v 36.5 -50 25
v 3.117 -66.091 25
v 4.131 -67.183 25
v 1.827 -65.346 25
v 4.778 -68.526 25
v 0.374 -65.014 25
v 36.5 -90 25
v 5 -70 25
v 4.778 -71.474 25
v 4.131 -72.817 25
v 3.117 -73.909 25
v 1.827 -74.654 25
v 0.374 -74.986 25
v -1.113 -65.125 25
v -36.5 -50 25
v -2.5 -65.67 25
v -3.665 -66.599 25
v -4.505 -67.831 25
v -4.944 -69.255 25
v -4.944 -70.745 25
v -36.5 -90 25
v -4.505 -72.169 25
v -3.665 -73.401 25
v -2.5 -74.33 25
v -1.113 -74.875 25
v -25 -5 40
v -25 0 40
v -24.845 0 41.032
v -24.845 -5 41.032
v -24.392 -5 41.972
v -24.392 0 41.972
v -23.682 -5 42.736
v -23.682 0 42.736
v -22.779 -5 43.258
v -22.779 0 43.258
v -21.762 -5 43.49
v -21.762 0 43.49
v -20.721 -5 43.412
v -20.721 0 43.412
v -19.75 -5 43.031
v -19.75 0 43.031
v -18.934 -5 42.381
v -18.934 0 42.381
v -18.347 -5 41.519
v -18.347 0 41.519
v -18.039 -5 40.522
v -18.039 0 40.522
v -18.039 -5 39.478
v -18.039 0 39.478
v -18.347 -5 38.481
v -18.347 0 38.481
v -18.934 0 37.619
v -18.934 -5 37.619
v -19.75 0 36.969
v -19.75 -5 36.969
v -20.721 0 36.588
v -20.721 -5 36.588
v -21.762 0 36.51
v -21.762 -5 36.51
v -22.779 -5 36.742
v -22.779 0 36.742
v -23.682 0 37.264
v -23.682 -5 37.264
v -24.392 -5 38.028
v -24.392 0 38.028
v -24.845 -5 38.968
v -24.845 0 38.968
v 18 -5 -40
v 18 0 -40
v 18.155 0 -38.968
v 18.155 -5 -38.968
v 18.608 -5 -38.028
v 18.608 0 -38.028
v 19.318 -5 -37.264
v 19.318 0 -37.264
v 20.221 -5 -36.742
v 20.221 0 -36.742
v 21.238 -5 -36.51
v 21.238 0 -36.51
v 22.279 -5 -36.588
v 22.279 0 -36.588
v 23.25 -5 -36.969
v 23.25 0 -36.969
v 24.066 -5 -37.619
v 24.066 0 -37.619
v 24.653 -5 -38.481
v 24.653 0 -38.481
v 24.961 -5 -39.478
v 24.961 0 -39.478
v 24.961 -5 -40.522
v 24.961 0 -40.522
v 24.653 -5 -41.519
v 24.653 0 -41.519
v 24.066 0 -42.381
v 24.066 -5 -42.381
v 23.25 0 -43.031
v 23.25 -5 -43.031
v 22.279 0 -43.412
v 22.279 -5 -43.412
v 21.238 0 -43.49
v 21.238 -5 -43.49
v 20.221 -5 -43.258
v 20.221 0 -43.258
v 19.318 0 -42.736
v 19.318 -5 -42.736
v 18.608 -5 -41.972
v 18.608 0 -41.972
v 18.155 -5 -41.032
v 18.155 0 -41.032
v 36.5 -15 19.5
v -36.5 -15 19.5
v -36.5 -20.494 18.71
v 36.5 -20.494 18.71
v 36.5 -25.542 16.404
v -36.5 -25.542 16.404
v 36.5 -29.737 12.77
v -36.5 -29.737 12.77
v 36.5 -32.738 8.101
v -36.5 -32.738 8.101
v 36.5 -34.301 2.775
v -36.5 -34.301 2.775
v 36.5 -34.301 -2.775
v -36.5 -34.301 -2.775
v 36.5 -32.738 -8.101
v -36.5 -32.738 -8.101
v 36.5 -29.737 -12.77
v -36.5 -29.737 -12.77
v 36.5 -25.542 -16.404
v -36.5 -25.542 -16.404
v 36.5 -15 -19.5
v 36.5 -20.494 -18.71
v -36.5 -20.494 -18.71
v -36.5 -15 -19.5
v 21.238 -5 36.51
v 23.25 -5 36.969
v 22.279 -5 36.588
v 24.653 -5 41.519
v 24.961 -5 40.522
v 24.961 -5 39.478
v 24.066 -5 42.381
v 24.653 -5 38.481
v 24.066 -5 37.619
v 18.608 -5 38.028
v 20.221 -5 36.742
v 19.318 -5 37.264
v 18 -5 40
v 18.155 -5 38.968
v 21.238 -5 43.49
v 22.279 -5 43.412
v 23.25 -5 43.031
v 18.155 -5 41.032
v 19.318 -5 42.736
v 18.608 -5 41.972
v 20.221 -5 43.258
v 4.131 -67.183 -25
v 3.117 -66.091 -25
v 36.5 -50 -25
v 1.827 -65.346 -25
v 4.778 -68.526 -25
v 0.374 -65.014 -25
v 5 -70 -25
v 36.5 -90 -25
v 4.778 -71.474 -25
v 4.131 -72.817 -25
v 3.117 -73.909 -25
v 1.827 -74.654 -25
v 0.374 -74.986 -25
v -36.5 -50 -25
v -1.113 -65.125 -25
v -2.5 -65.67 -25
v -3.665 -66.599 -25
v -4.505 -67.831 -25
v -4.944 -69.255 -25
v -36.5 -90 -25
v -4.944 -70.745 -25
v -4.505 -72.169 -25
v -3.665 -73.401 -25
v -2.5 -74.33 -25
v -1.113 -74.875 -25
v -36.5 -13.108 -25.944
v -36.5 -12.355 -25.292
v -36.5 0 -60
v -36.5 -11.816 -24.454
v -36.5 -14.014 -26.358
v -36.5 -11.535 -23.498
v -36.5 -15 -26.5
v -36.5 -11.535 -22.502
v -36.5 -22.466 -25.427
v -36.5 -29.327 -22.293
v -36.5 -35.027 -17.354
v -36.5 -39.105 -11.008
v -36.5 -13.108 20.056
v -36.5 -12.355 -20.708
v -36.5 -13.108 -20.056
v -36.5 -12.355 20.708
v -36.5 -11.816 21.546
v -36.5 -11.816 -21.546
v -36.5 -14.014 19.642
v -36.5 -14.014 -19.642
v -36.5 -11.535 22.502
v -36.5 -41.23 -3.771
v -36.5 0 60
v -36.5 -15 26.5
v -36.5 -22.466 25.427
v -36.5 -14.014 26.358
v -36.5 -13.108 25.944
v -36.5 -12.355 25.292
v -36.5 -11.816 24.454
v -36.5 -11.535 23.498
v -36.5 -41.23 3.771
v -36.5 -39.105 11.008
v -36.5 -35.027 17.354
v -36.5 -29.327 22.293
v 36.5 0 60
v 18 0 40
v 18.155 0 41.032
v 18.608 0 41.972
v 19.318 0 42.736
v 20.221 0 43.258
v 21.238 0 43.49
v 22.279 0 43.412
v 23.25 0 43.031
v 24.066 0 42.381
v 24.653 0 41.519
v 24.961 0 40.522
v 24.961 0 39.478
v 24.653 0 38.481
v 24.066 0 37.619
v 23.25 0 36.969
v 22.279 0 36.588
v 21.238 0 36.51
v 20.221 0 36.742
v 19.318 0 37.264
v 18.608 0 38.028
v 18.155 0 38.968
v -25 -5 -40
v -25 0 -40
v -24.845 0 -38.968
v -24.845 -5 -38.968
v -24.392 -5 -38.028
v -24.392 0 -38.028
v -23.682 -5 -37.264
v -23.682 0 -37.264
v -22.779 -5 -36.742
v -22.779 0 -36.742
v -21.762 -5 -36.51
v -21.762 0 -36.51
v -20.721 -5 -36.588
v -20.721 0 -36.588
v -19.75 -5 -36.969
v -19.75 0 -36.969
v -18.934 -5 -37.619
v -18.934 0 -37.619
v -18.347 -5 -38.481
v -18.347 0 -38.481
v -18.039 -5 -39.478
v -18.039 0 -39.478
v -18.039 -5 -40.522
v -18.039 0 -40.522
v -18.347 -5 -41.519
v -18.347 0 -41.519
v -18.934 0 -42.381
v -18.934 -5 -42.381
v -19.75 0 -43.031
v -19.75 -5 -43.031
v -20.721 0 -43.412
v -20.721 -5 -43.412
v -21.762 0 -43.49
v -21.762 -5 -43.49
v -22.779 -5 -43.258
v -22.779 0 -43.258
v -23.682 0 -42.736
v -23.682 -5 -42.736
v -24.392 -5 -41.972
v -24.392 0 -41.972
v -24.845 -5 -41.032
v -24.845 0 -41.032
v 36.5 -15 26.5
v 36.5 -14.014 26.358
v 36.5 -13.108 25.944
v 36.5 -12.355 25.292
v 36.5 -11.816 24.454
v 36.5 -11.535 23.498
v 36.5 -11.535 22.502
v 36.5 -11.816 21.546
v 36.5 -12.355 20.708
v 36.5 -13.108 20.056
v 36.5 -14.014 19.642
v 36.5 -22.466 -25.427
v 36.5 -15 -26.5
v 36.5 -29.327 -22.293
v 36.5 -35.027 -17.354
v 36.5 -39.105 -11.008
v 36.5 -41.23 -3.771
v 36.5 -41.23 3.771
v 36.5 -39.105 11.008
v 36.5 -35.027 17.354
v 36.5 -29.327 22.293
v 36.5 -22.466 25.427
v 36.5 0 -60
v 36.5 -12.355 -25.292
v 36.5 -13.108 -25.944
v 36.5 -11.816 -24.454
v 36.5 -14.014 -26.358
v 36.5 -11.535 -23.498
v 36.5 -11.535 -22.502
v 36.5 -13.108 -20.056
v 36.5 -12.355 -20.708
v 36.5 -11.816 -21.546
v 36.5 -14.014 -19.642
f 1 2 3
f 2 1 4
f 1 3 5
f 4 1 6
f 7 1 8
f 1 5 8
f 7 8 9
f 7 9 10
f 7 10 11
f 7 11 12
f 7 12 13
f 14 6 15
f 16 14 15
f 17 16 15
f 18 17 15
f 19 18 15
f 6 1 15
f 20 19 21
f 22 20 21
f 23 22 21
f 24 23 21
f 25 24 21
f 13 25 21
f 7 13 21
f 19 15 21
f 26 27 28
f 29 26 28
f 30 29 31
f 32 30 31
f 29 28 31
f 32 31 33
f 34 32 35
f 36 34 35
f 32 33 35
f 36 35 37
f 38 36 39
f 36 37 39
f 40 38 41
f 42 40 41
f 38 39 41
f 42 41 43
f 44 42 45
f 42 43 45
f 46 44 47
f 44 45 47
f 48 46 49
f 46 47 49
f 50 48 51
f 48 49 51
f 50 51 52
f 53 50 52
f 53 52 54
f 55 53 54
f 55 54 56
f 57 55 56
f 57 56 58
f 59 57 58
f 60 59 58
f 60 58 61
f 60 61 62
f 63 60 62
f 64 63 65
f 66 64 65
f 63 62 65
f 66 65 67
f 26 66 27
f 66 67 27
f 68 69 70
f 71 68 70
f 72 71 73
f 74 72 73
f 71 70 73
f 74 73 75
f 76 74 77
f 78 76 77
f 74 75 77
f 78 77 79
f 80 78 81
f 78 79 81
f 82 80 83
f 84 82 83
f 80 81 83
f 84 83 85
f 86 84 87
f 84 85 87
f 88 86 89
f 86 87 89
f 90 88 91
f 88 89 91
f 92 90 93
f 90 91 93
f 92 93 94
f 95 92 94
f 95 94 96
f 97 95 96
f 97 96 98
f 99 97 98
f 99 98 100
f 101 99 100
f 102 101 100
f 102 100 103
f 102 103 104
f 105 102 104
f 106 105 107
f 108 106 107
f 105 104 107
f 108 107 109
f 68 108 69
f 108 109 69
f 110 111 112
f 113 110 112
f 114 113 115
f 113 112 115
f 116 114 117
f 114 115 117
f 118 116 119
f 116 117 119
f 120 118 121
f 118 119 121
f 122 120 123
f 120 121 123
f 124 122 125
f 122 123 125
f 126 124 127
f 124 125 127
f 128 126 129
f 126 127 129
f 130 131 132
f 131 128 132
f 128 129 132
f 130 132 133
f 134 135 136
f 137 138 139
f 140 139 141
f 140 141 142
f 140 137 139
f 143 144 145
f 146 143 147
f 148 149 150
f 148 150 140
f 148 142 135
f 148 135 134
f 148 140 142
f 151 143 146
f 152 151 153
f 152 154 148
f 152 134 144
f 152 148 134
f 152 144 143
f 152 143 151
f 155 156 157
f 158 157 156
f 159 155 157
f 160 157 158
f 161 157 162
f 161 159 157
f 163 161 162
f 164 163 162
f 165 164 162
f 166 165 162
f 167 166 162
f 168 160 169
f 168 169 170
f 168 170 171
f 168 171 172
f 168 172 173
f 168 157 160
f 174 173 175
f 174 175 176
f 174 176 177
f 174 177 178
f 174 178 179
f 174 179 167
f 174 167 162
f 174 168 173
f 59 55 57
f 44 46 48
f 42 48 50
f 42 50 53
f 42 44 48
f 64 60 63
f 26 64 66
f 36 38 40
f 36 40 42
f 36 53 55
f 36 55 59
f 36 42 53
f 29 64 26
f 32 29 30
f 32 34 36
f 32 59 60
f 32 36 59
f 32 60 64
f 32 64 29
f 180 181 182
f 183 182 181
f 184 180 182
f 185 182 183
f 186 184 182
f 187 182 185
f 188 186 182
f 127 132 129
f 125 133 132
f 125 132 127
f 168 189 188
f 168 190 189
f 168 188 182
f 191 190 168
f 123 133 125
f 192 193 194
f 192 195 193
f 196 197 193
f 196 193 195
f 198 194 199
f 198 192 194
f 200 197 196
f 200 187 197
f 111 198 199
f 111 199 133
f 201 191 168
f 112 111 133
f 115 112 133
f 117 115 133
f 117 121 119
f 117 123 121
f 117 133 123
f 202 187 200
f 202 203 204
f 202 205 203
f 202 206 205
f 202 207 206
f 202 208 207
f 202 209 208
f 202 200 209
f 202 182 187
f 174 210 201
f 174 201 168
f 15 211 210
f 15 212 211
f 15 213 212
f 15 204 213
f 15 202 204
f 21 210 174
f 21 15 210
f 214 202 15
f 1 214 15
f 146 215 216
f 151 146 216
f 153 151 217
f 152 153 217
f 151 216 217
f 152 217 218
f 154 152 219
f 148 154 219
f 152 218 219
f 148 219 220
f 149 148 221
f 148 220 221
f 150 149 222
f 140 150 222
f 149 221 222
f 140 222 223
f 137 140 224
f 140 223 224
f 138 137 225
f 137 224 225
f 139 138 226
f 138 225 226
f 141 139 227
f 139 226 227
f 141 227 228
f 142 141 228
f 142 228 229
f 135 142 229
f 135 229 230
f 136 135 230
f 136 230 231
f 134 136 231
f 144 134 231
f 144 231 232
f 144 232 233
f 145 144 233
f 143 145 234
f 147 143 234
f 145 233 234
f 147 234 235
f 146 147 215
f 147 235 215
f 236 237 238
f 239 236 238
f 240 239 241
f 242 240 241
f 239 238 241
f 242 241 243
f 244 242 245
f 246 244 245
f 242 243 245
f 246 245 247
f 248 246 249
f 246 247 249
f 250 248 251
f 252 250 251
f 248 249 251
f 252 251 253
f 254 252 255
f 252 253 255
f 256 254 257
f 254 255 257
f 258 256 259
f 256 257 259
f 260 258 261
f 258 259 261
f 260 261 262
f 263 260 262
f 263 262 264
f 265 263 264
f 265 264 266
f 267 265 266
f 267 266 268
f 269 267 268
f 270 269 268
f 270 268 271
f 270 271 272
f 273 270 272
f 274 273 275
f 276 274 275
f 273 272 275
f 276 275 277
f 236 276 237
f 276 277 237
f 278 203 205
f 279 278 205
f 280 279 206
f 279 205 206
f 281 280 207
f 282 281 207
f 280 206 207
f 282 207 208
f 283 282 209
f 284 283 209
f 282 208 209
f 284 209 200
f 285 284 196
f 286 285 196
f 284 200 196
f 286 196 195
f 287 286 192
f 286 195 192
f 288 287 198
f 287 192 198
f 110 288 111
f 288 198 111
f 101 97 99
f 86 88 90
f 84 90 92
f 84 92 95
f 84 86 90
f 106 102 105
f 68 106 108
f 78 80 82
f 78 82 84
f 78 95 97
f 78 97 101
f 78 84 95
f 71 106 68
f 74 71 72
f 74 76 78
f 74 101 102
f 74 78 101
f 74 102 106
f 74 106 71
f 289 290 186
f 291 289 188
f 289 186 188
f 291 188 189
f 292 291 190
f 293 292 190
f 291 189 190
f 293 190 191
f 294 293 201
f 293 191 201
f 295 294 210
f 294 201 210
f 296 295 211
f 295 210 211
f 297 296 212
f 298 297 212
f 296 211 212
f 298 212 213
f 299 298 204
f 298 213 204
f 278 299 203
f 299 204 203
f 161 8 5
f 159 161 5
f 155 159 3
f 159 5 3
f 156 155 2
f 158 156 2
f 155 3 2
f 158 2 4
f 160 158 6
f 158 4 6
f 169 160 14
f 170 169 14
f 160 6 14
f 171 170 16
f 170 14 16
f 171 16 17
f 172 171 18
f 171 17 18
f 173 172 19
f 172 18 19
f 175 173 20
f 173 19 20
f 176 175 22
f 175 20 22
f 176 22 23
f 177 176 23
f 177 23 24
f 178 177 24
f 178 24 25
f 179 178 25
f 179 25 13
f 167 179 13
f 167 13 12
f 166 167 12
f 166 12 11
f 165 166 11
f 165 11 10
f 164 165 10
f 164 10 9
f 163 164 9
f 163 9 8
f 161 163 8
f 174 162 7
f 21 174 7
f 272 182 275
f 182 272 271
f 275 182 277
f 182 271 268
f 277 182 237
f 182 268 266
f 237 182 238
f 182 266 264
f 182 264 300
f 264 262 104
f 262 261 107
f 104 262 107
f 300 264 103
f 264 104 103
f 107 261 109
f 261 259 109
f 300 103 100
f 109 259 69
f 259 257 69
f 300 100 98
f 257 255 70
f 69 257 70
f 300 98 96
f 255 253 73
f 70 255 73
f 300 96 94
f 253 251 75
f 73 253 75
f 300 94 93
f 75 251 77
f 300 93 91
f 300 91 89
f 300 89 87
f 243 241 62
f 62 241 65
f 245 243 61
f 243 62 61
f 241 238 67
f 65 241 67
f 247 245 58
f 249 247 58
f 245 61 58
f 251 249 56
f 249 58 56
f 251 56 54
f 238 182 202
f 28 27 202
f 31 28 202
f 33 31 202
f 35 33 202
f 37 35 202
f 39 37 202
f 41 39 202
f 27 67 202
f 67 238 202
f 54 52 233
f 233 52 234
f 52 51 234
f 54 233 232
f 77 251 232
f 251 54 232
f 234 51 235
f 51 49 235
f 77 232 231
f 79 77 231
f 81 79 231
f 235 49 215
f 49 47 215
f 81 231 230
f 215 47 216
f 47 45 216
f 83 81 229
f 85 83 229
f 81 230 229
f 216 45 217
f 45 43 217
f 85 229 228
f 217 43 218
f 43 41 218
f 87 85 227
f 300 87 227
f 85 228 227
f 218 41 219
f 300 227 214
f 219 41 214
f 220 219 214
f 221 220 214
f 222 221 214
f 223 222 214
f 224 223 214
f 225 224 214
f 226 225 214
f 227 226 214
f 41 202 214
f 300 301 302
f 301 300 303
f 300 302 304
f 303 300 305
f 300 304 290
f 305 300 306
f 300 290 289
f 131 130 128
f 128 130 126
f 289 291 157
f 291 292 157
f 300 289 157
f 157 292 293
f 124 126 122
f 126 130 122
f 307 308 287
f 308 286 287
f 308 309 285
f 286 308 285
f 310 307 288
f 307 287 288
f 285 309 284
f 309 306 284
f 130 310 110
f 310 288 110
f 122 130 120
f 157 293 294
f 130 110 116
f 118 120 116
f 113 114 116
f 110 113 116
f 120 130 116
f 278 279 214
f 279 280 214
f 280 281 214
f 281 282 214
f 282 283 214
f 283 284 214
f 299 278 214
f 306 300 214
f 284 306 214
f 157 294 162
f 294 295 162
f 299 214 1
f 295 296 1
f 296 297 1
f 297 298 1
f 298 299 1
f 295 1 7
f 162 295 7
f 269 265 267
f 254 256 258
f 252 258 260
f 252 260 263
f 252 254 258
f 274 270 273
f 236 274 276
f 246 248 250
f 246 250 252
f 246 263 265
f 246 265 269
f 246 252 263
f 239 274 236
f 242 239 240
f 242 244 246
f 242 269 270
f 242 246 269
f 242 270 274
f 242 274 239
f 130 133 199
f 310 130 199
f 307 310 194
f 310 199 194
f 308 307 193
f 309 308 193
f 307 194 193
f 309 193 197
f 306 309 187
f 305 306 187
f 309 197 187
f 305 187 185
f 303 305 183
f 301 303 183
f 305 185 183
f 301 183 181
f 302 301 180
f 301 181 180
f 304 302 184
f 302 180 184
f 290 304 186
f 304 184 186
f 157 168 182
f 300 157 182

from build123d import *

# Parameters (mm, degrees)
F0_W      = 73
F0_H      = 120
F1_DEPTH  = 50
F3_DEPTH  = 80
F5_DEPTH  = 80
F6_R      = 3.5
F7_DEPTH  = 5
F8_W      = 40
F8_H      = 50
F9_DEPTH  = 73
F10_R     = 5
F11_DEPTH = 80


with BuildPart() as f1:
    # F0 (on Front) → F1 (new body)
    with BuildSketch(Plane.XZ):
        Rectangle(F0_W, F0_H)
    extrude(amount=F1_DEPTH)

    # F2 (on face) → F3 (cut)
    with BuildSketch(Plane(origin=(-36.5, 0, 0), x_dir=(0, -1, 0), z_dir=(-1, 0, 0))):
        with BuildLine():
            ThreePointArc((14.9997541366, 19.5), (34.4997541366, 0), (14.9997541366, -19.5))
            ThreePointArc((14.9997541366, -19.5), (11.4997541366, -23), (14.9997541366, -26.5))
            ThreePointArc((14.9997541366, -26.5), (41.4997541366, 0), (14.9997541366, 26.5))
            ThreePointArc((14.9997541366, 26.5), (11.4997541366, 23), (14.9997541366, 19.5))
        make_face()
    extrude(amount=-F3_DEPTH, mode=Mode.SUBTRACT)

    # F4 (on face) → F5 (cut)
    with BuildSketch(Plane(origin=(-36.5, 0, 0), x_dir=(0, -1, 0), z_dir=(-1, 0, 0))):
        Polygon((50, 60), (0, 60), (50, 25), align=None)
        Polygon((50, -25), (0, -60), (50, -60), align=None)
    extrude(amount=-F5_DEPTH, mode=Mode.SUBTRACT)

    # F6 (on face) → F7 (cut)
    with BuildSketch(Plane(origin=(0, 0, 0), x_dir=(-1, 0, 0), z_dir=(0, 1, 0))):
        with Locations((-21.5, 40)):
            Circle(F6_R)
        with Locations((21.5, 40)):
            Circle(F6_R)
        with Locations((-21.5, -40)):
            Circle(F6_R)
        with Locations((21.5, -40)):
            Circle(F6_R)
    extrude(amount=-F7_DEPTH, mode=Mode.SUBTRACT)

    # F8 (on face) → F9 (join)
    with BuildSketch(Plane(origin=(-36.5, 0, 0), x_dir=(0, -1, 0), z_dir=(-1, 0, 0))):
        with Locations((70, 0)):
            Rectangle(F8_W, F8_H)
    extrude(amount=-F9_DEPTH)

    # F10 (on face) → F11 (cut)
    with BuildSketch(Plane.XY.offset(25)):
        with Locations((0, -70)):
            Circle(F10_R)
    extrude(amount=-F11_DEPTH, mode=Mode.SUBTRACT)


solid = f1.part
